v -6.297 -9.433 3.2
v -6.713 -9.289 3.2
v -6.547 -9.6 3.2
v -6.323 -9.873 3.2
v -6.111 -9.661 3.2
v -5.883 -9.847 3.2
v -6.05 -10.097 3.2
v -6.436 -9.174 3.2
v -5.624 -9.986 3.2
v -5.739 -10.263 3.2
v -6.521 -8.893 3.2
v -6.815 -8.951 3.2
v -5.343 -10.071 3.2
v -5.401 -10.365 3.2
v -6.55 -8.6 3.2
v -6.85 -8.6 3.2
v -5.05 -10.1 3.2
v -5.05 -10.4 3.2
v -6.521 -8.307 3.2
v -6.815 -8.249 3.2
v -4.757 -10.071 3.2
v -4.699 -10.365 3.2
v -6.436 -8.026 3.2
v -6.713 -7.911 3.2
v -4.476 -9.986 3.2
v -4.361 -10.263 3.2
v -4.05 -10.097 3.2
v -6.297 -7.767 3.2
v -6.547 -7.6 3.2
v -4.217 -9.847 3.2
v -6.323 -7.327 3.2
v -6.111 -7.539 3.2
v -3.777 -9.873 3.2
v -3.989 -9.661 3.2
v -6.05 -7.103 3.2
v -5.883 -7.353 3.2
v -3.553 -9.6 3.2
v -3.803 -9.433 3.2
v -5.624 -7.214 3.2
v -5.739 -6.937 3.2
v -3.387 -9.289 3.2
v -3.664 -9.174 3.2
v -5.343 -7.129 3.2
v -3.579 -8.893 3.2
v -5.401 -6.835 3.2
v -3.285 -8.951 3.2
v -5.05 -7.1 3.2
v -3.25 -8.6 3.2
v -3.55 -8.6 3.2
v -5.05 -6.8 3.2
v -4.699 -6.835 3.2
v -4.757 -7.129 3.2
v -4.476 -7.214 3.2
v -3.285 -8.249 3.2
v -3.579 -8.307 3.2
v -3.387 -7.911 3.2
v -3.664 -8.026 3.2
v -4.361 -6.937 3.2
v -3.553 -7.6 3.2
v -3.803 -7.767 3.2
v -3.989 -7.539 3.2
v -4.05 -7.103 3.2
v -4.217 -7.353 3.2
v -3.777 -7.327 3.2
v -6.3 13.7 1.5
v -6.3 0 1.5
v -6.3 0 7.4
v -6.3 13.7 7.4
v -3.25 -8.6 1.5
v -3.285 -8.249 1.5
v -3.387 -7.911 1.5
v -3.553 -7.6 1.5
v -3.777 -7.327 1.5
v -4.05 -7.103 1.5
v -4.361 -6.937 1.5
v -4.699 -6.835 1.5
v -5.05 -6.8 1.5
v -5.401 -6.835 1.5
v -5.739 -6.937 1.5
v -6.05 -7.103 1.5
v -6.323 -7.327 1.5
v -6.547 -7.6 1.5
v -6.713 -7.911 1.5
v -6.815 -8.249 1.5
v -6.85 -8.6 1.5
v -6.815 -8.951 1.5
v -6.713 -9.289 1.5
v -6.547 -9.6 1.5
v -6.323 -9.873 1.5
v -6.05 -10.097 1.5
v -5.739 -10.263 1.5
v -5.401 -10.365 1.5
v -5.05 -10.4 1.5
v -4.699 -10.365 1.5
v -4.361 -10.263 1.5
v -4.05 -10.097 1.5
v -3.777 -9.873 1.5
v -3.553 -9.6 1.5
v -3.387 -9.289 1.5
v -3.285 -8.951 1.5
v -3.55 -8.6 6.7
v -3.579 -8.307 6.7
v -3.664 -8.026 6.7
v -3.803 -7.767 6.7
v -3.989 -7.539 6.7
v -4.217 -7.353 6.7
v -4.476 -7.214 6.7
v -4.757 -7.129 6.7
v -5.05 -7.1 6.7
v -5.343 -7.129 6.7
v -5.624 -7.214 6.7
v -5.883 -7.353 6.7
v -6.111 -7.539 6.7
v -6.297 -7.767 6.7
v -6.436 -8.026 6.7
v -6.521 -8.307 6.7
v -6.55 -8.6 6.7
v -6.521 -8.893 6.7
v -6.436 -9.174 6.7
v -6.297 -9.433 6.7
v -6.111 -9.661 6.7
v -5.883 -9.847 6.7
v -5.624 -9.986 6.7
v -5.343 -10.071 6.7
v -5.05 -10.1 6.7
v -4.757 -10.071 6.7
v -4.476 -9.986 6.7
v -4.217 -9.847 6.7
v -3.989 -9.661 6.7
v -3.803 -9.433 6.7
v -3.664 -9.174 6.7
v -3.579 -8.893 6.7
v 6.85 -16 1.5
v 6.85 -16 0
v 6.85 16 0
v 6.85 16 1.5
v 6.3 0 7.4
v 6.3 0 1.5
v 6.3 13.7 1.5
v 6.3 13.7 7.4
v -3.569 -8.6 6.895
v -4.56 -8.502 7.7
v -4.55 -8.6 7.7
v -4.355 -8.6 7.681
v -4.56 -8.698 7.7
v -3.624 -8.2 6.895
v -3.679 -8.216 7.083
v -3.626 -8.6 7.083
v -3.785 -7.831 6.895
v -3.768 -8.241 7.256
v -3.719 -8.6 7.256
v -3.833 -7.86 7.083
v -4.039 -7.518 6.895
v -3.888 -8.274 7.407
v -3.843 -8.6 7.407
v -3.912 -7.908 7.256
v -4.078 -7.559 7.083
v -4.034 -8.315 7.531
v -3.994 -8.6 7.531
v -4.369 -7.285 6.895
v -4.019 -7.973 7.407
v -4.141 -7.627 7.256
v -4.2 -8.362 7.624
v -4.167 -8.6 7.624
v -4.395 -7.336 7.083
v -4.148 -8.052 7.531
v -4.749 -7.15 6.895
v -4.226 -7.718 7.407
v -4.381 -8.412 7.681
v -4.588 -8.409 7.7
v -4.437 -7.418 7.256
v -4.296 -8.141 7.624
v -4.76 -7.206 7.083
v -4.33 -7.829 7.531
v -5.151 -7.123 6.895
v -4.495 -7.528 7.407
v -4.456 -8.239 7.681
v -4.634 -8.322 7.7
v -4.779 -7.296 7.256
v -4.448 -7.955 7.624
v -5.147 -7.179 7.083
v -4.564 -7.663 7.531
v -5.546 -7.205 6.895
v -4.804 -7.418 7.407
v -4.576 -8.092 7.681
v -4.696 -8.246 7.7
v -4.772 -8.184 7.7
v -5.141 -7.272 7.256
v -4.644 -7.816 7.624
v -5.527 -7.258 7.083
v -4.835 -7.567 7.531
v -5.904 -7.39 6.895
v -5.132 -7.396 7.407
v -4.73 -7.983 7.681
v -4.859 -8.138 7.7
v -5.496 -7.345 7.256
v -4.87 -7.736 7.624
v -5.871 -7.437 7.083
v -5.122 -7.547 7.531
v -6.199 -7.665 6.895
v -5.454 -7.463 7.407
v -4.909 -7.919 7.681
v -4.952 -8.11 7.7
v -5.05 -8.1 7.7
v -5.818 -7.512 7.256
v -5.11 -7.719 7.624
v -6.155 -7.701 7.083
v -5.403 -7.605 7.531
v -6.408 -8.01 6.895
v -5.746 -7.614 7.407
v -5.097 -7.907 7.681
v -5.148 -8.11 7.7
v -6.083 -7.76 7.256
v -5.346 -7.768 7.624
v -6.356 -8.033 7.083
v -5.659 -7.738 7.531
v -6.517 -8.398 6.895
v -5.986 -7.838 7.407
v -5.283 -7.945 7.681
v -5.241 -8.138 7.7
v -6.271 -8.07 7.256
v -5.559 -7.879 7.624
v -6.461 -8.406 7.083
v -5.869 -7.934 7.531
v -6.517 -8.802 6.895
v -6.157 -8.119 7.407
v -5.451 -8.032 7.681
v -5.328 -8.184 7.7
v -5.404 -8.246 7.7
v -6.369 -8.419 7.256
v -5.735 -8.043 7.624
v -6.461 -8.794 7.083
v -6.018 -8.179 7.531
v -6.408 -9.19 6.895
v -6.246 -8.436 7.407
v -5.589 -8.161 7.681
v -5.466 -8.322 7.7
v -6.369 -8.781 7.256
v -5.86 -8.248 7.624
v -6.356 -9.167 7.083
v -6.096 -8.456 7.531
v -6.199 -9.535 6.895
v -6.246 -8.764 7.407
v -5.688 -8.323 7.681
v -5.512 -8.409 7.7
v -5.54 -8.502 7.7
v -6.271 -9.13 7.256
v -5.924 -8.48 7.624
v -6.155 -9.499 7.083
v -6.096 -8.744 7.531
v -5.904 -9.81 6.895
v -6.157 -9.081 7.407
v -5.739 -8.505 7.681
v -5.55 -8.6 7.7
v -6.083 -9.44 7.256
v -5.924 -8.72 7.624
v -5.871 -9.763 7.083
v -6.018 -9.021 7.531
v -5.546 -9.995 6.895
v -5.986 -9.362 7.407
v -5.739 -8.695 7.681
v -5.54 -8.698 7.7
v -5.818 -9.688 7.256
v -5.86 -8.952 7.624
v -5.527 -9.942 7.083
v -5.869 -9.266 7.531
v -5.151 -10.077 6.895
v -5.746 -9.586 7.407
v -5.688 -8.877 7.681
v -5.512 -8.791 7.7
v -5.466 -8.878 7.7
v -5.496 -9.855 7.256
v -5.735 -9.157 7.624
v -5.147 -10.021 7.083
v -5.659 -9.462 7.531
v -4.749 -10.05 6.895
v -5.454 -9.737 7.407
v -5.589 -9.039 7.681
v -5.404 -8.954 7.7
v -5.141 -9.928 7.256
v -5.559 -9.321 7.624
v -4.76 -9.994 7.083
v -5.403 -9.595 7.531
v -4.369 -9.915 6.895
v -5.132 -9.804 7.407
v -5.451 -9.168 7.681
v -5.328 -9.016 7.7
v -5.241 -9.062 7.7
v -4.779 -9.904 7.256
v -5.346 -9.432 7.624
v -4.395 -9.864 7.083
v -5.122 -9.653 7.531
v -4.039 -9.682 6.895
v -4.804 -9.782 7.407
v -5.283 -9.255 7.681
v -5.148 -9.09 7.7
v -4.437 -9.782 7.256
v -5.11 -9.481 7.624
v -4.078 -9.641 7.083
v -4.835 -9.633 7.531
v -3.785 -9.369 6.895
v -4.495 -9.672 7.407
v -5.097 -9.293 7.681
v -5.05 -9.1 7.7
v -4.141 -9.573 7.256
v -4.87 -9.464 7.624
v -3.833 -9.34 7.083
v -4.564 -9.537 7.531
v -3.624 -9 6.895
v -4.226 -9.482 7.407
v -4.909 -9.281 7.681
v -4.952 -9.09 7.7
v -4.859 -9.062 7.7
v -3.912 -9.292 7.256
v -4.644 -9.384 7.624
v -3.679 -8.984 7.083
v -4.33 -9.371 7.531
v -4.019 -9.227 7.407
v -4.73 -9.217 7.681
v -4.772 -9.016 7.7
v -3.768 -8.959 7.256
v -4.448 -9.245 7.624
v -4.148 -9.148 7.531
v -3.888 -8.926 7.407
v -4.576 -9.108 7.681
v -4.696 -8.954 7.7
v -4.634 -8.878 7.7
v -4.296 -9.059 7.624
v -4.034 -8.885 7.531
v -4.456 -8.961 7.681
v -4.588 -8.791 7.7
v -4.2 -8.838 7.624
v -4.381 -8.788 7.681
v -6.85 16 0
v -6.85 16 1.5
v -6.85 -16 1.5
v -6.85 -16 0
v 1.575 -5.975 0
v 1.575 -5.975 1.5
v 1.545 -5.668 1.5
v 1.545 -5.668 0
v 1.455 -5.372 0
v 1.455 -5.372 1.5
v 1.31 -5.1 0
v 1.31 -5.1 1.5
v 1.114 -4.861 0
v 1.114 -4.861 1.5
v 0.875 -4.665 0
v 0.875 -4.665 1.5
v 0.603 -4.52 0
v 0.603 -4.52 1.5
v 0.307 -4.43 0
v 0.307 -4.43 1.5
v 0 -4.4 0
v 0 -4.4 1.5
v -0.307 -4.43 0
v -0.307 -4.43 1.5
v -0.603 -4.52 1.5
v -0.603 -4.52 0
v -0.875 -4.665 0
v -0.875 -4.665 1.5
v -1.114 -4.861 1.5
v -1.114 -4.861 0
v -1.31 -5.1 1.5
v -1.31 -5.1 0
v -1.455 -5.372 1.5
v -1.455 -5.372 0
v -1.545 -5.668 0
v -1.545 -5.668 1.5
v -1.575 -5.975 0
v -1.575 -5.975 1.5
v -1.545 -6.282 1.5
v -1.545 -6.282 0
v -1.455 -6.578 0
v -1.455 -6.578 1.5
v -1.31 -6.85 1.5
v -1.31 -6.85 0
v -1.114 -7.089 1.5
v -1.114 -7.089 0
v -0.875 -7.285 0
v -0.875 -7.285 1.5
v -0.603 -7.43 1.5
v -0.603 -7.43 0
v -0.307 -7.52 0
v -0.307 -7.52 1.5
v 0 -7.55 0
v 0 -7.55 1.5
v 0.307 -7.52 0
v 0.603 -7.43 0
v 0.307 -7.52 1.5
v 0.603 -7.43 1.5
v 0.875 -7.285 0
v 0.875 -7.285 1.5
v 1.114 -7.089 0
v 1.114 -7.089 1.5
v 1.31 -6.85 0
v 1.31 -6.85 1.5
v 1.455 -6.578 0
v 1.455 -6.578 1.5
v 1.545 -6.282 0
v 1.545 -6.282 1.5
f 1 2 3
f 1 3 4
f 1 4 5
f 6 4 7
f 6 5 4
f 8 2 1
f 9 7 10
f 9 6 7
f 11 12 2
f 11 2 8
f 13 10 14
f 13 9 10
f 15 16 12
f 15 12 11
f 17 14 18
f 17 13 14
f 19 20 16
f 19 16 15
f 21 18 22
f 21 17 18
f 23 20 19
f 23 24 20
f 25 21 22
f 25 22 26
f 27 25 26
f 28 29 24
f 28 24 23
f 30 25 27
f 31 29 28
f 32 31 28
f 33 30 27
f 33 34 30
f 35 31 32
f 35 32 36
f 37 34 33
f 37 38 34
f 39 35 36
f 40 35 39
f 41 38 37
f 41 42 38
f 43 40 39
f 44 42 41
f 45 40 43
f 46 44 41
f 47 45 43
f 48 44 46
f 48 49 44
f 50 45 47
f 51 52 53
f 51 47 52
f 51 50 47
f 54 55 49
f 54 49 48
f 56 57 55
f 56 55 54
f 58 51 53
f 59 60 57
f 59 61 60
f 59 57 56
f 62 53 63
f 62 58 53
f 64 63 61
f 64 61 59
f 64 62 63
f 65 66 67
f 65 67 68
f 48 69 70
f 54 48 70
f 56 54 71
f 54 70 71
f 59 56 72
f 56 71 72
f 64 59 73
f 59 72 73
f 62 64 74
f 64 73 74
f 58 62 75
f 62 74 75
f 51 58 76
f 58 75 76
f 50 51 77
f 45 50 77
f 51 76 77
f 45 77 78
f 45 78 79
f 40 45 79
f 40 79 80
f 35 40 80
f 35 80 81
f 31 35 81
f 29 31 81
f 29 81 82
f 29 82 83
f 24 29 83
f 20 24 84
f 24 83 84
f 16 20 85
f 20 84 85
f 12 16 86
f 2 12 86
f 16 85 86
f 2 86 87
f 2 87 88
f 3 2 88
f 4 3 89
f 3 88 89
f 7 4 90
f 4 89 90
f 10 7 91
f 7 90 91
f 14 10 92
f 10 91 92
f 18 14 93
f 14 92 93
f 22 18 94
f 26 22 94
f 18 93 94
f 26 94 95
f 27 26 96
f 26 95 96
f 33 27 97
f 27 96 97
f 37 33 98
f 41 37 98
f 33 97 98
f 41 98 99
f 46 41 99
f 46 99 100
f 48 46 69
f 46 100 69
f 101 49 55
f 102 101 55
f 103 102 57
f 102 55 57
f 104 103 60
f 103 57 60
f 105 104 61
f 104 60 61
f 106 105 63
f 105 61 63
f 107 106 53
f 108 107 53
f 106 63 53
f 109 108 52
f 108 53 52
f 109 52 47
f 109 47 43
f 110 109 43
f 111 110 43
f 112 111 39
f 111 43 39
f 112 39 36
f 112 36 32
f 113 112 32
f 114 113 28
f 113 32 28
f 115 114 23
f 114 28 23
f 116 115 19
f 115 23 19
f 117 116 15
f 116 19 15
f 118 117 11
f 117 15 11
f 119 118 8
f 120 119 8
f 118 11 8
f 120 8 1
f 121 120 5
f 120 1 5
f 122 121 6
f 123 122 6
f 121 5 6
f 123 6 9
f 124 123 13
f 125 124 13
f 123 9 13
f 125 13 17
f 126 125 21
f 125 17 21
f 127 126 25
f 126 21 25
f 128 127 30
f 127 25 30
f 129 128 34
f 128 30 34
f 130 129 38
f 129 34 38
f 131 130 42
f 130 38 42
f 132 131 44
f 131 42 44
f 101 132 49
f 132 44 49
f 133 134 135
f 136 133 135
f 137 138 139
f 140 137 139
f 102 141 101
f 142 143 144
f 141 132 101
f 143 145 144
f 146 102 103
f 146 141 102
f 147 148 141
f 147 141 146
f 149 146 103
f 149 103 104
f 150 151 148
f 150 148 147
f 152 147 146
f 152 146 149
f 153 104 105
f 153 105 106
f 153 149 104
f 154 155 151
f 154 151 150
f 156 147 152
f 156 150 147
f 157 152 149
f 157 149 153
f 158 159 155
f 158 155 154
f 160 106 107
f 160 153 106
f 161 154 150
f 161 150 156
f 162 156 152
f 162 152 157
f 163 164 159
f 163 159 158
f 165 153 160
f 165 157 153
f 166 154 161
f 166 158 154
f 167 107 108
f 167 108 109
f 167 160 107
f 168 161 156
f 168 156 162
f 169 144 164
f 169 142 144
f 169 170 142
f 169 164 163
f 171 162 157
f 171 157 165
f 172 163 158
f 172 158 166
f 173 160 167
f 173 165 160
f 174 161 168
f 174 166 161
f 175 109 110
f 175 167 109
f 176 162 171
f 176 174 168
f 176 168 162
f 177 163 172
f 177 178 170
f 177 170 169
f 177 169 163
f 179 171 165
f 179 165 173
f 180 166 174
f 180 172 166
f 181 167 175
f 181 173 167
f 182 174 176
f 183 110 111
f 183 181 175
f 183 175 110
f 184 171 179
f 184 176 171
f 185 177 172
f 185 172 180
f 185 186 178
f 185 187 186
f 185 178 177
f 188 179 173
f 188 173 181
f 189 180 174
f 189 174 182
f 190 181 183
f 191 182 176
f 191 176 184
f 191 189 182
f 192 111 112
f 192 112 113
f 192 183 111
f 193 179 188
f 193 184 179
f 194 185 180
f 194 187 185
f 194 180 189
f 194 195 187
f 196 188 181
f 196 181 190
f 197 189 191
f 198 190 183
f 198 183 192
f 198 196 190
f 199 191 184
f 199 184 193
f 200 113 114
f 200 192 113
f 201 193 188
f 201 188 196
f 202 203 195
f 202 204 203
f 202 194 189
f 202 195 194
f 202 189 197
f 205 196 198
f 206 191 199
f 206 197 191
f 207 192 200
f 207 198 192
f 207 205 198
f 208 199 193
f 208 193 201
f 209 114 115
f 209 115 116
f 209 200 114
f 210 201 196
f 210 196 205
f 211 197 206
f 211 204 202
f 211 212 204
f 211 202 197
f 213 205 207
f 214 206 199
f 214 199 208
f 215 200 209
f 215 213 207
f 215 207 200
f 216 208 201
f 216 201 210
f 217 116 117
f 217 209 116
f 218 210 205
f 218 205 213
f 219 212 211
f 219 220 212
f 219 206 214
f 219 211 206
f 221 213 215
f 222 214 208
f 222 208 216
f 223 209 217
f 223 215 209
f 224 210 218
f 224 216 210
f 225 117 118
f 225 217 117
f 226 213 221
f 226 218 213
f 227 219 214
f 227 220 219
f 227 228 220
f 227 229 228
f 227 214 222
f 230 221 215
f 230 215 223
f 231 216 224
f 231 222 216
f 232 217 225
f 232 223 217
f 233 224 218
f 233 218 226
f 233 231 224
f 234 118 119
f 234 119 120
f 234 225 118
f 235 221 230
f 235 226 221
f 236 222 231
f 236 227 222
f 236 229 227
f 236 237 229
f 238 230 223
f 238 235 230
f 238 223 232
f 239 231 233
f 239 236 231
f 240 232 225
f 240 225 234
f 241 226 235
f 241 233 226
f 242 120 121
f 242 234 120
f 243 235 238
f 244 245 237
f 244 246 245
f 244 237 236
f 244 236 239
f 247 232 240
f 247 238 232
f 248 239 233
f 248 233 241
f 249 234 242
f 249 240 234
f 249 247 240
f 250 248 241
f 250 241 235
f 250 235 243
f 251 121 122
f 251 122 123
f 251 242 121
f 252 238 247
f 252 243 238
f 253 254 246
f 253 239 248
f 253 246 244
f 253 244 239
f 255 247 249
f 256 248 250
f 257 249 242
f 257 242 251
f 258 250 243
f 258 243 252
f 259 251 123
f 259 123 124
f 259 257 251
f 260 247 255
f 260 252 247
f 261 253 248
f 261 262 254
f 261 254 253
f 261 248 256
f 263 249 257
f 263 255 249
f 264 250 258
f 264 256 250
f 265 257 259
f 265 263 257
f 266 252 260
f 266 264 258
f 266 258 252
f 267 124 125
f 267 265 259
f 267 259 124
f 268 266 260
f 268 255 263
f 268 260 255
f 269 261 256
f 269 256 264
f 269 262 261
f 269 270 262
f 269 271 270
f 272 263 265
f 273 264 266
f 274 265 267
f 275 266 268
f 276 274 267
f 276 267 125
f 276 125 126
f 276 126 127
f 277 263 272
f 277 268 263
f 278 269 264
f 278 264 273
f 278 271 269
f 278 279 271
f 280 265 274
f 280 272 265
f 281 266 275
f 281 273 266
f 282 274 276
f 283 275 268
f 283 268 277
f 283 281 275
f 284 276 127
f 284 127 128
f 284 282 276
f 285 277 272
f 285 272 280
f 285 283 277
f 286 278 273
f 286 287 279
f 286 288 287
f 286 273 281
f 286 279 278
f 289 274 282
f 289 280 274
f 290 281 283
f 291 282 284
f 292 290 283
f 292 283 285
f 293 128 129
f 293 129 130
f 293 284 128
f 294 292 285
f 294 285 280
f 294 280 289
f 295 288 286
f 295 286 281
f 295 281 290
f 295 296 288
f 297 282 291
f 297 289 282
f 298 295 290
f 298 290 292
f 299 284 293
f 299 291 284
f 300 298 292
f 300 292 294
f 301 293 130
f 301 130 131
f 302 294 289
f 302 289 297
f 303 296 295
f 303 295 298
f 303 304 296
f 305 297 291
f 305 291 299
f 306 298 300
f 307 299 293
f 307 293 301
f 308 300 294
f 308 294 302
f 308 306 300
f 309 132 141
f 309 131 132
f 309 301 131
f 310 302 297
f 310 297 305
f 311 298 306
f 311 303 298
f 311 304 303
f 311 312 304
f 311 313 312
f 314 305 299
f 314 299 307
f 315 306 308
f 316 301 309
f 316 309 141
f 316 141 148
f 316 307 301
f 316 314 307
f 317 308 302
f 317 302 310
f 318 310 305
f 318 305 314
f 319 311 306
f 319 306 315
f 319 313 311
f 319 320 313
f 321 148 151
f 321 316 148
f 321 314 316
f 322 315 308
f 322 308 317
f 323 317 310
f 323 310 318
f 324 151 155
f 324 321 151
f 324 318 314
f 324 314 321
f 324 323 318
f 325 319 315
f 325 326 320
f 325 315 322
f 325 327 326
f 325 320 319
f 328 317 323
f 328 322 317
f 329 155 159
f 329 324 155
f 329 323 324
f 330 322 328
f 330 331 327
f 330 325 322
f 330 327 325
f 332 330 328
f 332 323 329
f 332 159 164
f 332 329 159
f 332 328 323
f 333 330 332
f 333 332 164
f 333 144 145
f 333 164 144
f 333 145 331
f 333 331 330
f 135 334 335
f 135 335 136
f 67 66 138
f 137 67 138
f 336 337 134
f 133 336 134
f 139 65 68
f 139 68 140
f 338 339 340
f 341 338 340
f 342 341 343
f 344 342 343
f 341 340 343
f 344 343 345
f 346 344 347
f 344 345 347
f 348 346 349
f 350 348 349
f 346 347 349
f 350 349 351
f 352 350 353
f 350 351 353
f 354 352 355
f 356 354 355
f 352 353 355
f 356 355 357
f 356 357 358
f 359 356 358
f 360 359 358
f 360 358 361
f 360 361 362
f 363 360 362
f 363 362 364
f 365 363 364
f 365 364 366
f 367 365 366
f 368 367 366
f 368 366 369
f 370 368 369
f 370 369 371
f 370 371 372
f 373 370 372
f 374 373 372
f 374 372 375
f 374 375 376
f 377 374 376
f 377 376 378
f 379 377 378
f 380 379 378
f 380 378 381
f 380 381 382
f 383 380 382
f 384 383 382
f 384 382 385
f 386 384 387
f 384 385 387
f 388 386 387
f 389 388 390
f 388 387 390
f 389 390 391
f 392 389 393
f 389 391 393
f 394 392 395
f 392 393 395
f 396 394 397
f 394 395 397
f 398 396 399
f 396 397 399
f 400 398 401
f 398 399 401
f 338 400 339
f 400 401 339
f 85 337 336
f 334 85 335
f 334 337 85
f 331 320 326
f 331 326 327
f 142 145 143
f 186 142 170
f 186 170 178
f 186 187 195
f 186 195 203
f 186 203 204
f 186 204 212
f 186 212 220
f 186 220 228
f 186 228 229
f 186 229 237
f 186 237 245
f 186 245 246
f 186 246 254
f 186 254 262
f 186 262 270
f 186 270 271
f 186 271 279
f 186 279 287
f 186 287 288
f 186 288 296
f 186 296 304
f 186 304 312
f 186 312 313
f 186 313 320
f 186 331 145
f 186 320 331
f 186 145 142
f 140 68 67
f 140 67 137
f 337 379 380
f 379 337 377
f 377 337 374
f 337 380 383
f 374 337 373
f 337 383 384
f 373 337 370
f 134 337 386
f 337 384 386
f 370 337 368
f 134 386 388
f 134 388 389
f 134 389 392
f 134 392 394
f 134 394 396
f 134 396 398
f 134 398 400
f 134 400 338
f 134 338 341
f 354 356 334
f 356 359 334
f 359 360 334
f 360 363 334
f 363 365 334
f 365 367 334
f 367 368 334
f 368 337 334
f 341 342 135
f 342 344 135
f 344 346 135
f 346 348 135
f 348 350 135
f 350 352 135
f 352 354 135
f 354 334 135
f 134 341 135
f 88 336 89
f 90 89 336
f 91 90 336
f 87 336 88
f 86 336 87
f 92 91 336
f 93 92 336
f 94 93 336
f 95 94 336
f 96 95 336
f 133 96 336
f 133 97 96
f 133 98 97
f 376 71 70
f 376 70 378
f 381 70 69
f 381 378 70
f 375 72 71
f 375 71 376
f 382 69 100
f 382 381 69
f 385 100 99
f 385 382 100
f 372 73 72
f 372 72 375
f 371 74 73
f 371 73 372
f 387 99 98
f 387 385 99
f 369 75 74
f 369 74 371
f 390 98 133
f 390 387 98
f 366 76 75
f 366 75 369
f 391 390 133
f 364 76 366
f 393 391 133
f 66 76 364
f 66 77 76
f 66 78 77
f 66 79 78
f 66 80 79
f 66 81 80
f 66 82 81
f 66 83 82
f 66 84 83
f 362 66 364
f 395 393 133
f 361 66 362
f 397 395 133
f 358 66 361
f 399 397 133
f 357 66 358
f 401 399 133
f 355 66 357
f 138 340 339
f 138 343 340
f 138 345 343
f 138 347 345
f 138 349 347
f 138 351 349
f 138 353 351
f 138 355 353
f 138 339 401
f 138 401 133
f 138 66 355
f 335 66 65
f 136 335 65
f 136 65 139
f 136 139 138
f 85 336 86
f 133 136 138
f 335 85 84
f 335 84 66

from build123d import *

# Parameters (mm, degrees)
SKETCH1_W           = 13.7
SKETCH1_H           = 32
BOSS_EXTRUDE1_DEPTH = 1.5
SKETCH2_W           = 12.6
SKETCH2_H           = 13.7
BOSS_EXTRUDE2_DEPTH = 5.9
SKETCH3_R           = 1.8
BOSS_EXTRUDE3_DEPTH = 1.7
SKETCH6_R           = 1.5
BOSS_EXTRUDE4_DEPTH = 4.5
FILLET1_R           = 1
SKETCH7_R           = 1.575
CUT_EXTRUDE1_DEPTH  = 2.5


with BuildPart() as part:
    # Sketch1 → Boss-Extrude1 (new body)
    with BuildSketch(Plane.XY):
        Rectangle(SKETCH1_W, SKETCH1_H)
    extrude(amount=BOSS_EXTRUDE1_DEPTH)

    # Sketch2 → Boss-Extrude2 (add)
    with BuildSketch(Plane.XY.offset(1.5)):
        with Locations((0, 6.85)):
            Rectangle(SKETCH2_W, SKETCH2_H)
    extrude(amount=BOSS_EXTRUDE2_DEPTH)

    # Sketch3 → Boss-Extrude3 (add)
    with BuildSketch(Plane.XY.offset(1.5)):
        with Locations((-5.05, -8.6)):
            Circle(SKETCH3_R)
    extrude(amount=BOSS_EXTRUDE3_DEPTH)

    # Sketch6 → Boss-Extrude4 (add)
    with BuildSketch(Plane.XY.offset(3.2)):
        with Locations((-5.05, -8.6)):
            Circle(SKETCH6_R)
    extrude(amount=BOSS_EXTRUDE4_DEPTH)

    # Fillet1
    fillet1_edges = [part.edges().sort_by_distance(p)[0] for p in [
        (-6.55, -8.6, 7.7),
    ]]
    fillet(fillet1_edges, radius=FILLET1_R)

    # Sketch7 → Cut-Extrude1 (cut, through all)
    with BuildSketch(Plane.XY.offset(1.5)):
        with Locations((0, -5.975)):
            Circle(SKETCH7_R)
    extrude(amount=-CUT_EXTRUDE1_DEPTH, mode=Mode.SUBTRACT)


solid = part.part
